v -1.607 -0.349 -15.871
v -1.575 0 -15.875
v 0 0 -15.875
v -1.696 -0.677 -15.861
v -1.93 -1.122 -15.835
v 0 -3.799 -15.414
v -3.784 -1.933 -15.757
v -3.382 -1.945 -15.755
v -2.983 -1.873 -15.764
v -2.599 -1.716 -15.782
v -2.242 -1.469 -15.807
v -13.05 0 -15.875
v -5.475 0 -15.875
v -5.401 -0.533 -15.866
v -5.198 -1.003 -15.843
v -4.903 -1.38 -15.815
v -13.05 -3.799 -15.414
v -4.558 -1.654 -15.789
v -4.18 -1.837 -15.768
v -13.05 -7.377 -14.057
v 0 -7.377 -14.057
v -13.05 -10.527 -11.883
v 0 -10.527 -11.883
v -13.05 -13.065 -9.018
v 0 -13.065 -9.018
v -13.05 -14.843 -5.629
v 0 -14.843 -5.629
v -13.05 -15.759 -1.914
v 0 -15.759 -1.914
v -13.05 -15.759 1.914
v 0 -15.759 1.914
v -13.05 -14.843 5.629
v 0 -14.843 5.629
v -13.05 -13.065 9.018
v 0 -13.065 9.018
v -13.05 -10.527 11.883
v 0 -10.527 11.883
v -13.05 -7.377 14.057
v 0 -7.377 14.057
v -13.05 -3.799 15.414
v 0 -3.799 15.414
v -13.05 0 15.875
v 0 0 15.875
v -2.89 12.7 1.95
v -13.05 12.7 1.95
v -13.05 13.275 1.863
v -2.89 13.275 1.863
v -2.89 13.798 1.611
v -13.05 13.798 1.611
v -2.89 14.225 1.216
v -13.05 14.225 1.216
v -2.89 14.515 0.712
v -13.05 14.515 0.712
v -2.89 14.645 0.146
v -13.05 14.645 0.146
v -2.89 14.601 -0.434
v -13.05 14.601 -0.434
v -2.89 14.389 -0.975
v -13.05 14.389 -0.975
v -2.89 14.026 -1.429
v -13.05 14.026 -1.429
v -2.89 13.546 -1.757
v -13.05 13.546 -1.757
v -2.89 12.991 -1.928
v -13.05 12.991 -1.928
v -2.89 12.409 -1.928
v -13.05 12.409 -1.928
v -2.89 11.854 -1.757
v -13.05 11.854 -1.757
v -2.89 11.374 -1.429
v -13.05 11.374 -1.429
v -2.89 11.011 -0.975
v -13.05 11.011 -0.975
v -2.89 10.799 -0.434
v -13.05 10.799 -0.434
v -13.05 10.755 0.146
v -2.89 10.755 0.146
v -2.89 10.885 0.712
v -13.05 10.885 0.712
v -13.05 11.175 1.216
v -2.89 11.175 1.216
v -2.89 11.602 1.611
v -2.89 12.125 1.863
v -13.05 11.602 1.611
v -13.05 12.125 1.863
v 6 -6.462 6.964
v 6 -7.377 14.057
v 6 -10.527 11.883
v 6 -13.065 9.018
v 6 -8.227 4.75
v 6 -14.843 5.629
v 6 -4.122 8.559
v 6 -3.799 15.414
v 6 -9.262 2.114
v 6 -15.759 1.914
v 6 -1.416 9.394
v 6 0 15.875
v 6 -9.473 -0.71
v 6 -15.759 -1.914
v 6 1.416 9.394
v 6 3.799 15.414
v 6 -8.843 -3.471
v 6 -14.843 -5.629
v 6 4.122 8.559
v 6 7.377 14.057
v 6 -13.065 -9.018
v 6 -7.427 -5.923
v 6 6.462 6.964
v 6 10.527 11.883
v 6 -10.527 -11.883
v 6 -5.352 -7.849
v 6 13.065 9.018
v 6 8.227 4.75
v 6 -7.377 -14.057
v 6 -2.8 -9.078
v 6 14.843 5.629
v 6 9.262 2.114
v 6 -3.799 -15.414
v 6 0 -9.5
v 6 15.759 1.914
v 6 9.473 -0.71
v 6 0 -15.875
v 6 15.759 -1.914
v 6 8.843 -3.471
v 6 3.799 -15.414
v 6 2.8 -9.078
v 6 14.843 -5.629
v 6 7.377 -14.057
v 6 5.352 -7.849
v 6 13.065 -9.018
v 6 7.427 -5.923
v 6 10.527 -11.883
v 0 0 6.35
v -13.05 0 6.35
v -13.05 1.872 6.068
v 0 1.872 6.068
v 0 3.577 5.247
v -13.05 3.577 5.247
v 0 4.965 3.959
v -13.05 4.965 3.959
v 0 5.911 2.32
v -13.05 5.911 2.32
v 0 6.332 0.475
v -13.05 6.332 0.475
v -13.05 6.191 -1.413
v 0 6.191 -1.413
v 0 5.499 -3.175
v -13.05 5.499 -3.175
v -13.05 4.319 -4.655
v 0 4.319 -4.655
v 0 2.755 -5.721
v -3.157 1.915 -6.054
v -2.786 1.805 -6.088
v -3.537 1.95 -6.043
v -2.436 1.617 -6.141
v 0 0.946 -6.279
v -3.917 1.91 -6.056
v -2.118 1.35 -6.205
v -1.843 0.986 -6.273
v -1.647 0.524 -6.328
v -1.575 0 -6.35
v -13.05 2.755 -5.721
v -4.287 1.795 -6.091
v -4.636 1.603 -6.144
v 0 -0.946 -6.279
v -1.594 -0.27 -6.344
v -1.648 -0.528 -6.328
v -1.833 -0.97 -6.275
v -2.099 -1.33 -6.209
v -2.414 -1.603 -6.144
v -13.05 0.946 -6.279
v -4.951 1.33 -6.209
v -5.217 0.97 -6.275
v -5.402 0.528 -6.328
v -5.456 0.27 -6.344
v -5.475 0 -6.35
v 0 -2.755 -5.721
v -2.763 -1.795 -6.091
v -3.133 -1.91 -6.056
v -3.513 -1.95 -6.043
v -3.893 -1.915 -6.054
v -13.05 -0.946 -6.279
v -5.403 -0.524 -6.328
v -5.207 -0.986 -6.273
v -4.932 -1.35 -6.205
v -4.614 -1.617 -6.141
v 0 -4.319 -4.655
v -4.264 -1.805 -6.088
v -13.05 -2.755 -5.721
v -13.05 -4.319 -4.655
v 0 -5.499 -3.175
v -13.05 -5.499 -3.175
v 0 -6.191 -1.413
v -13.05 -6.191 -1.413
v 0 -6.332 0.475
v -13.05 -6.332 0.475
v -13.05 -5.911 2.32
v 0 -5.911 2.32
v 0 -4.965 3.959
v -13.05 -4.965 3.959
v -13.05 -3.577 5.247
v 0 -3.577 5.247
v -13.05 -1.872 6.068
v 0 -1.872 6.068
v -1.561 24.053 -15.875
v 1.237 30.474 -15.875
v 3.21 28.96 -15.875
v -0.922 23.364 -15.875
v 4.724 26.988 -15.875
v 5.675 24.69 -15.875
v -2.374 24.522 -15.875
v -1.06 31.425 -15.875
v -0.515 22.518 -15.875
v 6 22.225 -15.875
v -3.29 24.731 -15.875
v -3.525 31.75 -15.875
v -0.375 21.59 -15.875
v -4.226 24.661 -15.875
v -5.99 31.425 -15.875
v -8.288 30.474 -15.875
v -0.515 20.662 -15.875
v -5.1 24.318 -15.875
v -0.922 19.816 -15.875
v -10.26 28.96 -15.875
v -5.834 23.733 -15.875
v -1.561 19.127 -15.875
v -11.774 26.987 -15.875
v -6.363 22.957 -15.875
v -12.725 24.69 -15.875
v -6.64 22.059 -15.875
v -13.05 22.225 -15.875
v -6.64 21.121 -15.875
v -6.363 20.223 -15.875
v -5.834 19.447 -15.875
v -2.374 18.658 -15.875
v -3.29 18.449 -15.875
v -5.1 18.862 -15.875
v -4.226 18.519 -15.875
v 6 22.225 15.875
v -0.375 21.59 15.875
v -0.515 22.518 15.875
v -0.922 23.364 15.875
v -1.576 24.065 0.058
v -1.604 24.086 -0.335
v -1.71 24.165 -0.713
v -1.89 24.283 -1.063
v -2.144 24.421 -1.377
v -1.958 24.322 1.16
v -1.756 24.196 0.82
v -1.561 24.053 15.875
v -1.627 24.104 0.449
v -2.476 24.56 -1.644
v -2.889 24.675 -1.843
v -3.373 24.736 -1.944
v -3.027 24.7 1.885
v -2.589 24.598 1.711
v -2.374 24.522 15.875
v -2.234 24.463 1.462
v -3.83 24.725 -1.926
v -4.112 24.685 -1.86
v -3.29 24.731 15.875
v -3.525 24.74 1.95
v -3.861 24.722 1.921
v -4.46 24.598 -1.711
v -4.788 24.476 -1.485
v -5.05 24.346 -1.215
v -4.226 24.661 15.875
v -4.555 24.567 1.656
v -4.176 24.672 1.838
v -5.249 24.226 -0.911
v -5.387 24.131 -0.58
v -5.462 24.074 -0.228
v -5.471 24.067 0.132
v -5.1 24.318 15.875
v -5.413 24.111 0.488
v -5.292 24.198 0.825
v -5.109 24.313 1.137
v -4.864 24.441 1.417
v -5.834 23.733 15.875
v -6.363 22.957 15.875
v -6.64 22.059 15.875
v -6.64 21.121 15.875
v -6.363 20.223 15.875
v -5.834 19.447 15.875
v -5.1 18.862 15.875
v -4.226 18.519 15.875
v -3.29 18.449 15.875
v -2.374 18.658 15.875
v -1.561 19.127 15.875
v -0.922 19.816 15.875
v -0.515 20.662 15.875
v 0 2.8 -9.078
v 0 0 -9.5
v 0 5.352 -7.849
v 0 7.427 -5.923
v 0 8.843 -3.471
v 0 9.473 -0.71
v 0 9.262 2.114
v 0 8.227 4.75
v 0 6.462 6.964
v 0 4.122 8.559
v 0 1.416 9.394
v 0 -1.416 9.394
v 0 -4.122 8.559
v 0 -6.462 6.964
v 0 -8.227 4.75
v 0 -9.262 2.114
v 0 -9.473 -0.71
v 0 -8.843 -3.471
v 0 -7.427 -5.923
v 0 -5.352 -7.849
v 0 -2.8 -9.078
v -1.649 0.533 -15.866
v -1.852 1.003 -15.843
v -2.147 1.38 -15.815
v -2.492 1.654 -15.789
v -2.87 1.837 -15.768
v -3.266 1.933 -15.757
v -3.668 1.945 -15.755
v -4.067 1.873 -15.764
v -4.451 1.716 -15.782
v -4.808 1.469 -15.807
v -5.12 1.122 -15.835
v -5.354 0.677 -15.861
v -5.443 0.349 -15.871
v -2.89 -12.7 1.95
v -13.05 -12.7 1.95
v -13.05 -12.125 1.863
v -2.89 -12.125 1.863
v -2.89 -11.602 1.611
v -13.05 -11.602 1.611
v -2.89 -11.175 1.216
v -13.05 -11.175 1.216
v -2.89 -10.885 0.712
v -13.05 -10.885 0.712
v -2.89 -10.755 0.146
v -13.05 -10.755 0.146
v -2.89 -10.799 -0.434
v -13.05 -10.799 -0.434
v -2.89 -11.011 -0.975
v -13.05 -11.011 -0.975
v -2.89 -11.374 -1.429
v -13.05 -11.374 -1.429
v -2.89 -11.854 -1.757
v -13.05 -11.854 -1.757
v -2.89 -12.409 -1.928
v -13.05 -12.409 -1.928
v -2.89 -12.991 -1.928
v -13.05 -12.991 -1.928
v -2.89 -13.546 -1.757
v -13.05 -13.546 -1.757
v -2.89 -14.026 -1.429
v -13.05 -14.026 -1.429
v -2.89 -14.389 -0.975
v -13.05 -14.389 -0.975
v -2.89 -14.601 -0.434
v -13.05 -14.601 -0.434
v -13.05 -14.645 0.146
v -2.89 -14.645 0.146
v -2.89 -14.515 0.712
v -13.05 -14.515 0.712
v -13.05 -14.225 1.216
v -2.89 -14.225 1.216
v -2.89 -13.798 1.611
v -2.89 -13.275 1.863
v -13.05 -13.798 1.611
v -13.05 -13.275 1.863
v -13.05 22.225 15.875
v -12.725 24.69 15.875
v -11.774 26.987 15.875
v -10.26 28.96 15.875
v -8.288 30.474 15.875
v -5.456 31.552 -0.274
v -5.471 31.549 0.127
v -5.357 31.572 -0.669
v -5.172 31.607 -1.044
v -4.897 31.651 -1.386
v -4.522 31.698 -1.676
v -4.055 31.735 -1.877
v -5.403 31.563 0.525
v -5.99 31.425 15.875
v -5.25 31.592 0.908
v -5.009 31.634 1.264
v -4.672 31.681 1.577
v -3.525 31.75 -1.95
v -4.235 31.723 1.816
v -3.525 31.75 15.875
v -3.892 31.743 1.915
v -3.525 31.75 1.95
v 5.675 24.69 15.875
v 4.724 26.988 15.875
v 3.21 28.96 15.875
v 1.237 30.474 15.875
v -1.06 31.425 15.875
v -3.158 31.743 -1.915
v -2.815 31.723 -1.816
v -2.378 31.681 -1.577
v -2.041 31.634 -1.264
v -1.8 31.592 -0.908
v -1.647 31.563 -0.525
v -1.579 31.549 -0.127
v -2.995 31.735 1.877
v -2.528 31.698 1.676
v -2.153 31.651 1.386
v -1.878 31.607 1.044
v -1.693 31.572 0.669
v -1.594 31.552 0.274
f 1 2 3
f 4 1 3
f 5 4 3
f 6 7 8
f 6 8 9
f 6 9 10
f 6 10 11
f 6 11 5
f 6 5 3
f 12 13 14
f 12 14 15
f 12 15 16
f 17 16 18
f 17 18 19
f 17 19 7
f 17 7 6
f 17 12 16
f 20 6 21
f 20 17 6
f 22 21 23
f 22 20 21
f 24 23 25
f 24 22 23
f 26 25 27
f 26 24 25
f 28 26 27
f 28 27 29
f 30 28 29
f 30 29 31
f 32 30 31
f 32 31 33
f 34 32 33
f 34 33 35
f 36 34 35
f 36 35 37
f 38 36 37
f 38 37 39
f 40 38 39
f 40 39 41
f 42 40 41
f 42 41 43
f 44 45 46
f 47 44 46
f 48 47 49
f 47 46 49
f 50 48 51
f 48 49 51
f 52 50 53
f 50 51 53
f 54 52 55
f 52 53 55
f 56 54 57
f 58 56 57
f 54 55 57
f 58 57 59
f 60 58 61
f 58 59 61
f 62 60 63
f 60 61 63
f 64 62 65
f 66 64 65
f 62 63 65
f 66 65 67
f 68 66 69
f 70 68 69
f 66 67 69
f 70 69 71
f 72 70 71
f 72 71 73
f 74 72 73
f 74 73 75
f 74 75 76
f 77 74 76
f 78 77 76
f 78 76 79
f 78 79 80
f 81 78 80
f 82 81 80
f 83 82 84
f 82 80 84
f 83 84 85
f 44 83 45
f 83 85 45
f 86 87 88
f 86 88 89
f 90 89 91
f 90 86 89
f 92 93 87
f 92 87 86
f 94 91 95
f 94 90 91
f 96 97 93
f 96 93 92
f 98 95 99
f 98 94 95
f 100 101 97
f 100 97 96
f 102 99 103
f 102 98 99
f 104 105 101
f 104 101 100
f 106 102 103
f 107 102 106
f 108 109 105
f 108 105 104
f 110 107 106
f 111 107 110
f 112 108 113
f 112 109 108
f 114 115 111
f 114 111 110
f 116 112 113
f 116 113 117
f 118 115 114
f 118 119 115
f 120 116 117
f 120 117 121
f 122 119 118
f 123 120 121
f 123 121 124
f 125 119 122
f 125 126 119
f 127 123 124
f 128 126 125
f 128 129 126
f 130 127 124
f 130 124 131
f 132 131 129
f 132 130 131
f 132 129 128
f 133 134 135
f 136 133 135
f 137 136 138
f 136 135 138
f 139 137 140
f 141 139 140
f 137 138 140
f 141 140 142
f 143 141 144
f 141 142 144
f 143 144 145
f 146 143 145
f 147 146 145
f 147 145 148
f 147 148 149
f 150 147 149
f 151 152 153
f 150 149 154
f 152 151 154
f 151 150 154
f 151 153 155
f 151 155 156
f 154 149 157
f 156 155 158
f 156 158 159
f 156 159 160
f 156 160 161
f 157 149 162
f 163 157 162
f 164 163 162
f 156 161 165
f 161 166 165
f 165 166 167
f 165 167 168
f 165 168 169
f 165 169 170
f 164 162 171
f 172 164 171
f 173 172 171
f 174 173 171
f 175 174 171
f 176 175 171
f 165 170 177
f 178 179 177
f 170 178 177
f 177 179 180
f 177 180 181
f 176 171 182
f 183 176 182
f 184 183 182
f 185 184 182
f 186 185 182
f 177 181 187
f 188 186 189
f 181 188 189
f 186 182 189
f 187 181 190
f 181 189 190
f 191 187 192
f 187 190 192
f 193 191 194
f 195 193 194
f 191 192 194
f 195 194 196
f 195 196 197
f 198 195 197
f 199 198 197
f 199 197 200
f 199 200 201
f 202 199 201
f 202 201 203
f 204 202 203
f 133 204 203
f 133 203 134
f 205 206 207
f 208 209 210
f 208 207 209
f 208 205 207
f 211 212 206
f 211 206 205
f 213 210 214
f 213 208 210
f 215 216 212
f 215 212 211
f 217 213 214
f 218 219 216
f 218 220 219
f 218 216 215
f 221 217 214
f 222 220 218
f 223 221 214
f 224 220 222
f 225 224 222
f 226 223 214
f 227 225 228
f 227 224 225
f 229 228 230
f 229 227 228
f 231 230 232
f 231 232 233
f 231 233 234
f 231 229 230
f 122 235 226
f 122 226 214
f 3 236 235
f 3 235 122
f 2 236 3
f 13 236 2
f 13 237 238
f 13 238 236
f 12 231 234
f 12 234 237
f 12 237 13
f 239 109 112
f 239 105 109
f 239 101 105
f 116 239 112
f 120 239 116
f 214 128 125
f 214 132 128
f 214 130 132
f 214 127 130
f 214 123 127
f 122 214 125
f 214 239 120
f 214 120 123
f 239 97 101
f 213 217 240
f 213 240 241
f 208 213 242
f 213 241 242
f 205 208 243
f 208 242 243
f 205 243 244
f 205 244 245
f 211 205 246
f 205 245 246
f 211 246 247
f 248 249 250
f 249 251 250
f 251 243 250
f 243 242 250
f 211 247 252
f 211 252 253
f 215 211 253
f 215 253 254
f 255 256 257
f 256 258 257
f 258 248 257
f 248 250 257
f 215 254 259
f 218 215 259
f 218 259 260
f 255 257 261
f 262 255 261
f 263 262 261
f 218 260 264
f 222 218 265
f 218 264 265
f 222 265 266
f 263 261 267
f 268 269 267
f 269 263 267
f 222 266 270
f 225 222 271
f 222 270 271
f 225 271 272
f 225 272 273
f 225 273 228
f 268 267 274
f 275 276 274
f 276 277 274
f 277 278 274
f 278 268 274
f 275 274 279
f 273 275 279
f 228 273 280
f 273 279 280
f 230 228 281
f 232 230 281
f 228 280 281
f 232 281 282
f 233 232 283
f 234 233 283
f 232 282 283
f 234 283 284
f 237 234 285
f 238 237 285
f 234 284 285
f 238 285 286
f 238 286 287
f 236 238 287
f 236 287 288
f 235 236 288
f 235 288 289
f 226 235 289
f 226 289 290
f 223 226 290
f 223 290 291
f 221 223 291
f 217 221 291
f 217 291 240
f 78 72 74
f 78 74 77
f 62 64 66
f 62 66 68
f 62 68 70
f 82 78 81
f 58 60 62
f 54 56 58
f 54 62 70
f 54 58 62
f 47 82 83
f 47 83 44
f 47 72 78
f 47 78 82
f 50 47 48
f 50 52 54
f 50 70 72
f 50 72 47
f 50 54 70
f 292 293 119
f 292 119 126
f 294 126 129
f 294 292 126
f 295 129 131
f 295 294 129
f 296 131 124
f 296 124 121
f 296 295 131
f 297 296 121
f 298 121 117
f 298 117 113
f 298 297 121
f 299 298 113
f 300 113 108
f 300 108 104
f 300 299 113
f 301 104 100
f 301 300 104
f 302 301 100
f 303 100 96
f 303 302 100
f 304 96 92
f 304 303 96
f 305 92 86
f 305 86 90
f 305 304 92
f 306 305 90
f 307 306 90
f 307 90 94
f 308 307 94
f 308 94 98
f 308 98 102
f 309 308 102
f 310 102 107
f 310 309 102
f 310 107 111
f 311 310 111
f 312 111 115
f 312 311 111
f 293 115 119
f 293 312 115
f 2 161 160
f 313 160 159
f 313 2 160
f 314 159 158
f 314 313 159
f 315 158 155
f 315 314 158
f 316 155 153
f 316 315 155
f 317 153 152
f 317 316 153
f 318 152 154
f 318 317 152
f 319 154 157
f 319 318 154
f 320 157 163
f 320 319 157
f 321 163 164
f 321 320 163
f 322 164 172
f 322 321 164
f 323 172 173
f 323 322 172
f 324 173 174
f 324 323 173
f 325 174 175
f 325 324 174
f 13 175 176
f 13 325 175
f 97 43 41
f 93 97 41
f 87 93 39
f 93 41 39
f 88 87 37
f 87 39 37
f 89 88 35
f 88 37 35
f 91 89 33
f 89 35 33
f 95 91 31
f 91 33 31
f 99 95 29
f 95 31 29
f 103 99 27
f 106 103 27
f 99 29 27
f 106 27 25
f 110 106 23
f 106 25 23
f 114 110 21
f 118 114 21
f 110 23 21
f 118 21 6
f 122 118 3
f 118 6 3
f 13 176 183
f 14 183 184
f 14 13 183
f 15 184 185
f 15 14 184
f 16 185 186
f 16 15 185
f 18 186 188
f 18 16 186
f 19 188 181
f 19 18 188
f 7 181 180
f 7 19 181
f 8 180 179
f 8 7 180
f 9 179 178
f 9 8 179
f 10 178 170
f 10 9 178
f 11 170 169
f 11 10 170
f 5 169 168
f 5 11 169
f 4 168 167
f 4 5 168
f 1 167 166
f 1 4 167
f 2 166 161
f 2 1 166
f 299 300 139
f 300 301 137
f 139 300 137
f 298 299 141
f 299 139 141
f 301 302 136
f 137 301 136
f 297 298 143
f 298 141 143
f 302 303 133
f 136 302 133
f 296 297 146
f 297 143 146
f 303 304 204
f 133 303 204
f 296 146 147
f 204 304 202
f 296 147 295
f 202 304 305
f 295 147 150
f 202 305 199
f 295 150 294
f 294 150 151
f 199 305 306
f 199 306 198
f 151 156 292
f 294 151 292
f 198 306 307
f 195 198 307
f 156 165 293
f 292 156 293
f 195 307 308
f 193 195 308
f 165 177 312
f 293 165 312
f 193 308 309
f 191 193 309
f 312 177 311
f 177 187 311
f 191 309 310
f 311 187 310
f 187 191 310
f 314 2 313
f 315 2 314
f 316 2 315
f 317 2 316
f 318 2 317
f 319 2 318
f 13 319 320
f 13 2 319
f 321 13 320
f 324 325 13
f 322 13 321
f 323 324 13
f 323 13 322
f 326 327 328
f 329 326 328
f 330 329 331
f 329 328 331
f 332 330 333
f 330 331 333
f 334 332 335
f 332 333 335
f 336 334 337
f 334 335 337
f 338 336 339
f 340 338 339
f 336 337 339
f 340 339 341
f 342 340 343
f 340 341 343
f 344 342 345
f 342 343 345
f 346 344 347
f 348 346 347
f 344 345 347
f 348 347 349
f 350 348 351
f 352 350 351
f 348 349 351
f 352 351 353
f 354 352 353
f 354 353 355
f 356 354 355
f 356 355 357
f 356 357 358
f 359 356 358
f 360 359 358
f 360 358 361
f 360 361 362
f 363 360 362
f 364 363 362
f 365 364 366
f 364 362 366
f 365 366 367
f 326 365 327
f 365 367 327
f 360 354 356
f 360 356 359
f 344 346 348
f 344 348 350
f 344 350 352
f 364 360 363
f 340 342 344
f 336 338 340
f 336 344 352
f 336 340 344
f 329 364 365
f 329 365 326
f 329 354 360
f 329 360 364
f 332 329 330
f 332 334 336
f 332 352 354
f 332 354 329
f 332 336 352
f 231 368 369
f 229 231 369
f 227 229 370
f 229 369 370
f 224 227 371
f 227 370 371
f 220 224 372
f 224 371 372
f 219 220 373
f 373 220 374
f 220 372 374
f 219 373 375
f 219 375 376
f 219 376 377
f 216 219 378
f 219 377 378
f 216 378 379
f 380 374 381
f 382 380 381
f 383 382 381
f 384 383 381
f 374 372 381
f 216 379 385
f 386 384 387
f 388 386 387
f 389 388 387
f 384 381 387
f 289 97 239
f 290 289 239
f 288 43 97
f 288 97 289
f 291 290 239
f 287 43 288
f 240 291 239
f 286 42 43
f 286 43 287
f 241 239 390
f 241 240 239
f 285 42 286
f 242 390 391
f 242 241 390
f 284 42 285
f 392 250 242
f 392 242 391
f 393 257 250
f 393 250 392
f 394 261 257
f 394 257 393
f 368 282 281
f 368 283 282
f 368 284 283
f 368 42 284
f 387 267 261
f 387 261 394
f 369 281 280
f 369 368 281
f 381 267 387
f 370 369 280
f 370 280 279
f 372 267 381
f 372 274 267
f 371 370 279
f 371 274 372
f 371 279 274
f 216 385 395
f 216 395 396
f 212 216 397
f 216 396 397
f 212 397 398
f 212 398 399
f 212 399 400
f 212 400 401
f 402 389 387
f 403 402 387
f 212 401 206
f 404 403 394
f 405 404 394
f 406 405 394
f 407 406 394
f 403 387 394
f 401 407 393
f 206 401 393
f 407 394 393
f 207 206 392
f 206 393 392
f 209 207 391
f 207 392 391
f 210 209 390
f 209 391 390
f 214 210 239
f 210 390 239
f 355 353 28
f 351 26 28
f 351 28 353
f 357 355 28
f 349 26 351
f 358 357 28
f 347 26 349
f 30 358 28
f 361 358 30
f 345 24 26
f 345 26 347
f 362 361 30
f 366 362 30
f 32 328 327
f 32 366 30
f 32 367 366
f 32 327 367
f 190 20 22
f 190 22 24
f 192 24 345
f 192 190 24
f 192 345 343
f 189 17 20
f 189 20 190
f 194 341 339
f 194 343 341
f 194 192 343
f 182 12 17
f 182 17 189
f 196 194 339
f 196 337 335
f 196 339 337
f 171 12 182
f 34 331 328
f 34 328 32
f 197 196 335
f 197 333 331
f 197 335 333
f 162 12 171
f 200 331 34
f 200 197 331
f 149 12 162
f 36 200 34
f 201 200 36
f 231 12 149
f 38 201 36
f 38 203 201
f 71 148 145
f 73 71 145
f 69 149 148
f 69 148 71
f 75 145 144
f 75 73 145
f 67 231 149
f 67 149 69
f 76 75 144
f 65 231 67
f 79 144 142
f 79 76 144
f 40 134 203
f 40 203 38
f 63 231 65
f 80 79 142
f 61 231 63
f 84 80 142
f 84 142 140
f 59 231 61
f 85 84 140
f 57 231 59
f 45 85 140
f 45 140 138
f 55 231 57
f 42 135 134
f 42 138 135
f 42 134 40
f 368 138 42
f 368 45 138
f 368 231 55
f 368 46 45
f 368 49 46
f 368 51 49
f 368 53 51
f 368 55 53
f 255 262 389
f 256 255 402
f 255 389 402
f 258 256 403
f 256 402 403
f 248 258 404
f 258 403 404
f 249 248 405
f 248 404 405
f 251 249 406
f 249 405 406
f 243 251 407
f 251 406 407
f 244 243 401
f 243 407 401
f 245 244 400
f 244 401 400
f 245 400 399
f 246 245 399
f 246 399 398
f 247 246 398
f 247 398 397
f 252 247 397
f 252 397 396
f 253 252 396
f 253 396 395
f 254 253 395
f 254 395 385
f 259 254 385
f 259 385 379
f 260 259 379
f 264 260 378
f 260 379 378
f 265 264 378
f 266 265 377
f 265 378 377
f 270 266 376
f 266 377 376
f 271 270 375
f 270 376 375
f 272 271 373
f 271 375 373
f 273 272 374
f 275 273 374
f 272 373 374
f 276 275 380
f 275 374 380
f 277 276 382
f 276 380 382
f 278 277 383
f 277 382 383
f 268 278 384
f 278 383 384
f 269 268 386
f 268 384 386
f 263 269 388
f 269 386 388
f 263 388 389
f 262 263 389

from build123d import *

# Parameters (mm, degrees)
SKETCH1_R               = 15.875
SKETCH1_R_2             = 9.5
BOSS_EXTRUDE1_DEPTH     = 6
BOSS_EXTRUDE2_START     = 13.050000011
SKETCH2_R               = 15.875
SKETCH2_R_2             = 9.5
SKETCH2_R_3             = 6.35
BOSS_EXTRUDE2_DEPTH     = 13.050000011
SKETCH3_R               = 1.95
CUT_EXTRUDE1_DEPTH      = 10.16
CUT_EXTRUDE3_REACH      = 39.82
CUT_EXTRUDE3_END_RADIUS = 6.35
BOSS_EXTRUDE3_REACH     = 31.444
SKETCH7_R               = 3.15
CUT_EXTRUDE4_DEPTH      = 31.75
CUT_EXTRUDE5_REACH      = 53.87
CUT_EXTRUDE5_END_RADIUS = 3.15
SKETCH8_R               = 1.95
FILLET1_R               = 9.525


with BuildPart() as part:
    # Sketch1 → Boss-Extrude1 (new body)
    with BuildSketch(Plane(origin=(0, 0, 0), x_dir=(0, 0, -1), z_dir=(1, 0, 0))):
        Circle(SKETCH1_R)
        Circle(SKETCH1_R_2, mode=Mode.SUBTRACT)
    extrude(amount=BOSS_EXTRUDE1_DEPTH)

    # Sketch2 → Boss-Extrude2 (add)
    # profile 1 of 2: a face of its own
    with BuildSketch(Plane.ZY.offset(BOSS_EXTRUDE2_START)):
        Circle(SKETCH2_R)
        with Locations(Location((0, 0, 0), (0, 0, 180))):
            Circle(SKETCH2_R_2, mode=Mode.SUBTRACT)
    # profile 2 of 2: a face of its own
    with BuildSketch(Plane.ZY.offset(BOSS_EXTRUDE2_START)):
        with Locations(Location((0, 0, 0), (0, 0, 180))):
            Circle(SKETCH2_R_2)
        Circle(SKETCH2_R_3, mode=Mode.SUBTRACT)
    extrude(amount=-BOSS_EXTRUDE2_DEPTH)

    # Sketch3 → Cut-Extrude1 (cut)
    with BuildSketch(Plane.ZY.offset(13.050000011)):
        with Locations((0, -12.7)):
            Circle(SKETCH3_R)
        with Locations((0, 12.7)):
            Circle(SKETCH3_R)
    extrude(amount=-CUT_EXTRUDE1_DEPTH, mode=Mode.SUBTRACT)

    # Cut-Extrude3: up to this cylinder (the profile starts outside it)
    cut_extrude3_end = Plane(origin=(-3.525, 0, 0), z_dir=(1, 0, 0)) * Cylinder(CUT_EXTRUDE3_END_RADIUS, 93.34, mode=Mode.PRIVATE)
    # Sketch5 → Cut-Extrude3 (cut, up to the surface)
    with BuildSketch(Plane.XY.offset(-15.875), mode=Mode.PRIVATE) as cut_extrude3_sk1:
        with BuildLine():
            ThreePointArc((-1.575000006, 0), (-3.525000006, 1.95), (-5.475000006, 0))
            Line((-5.475000006, 0), (-1.575000006, 0))
        make_face()
    cut_extrude3_tool1 = extrude(cut_extrude3_sk1.sketch, amount=CUT_EXTRUDE3_REACH, mode=Mode.PRIVATE) - cut_extrude3_end
    add(cut_extrude3_tool1.solids().sort_by_distance((-3.525, 0.827606, -15.875))[0], mode=Mode.SUBTRACT)
    # Sketch5 → Cut-Extrude3 (cut, up to the surface)
    with BuildSketch(Plane.XY.offset(-15.875), mode=Mode.PRIVATE) as cut_extrude3_sk2:
        with BuildLine():
            Line((-1.575000006, 0), (-5.475000006, 0))
            ThreePointArc((-5.475000006, 0), (-3.525000006, -1.95), (-1.575000006, 0))
        make_face()
    cut_extrude3_tool2 = extrude(cut_extrude3_sk2.sketch, amount=CUT_EXTRUDE3_REACH, mode=Mode.PRIVATE) - cut_extrude3_end
    add(cut_extrude3_tool2.solids().sort_by_distance((-3.525, -0.827606, -15.875))[0], mode=Mode.SUBTRACT)
    # Sketch5 → Cut-Extrude3 (cut, up to the surface)
    with BuildSketch(Plane.XY.offset(-15.875), mode=Mode.PRIVATE) as cut_extrude3_sk3:
        with BuildLine():
            ThreePointArc((-1.575000006, 0), (-3.525000006, 1.95), (-5.475000006, 0))
            Line((-5.475000006, 0), (-1.575000006, 0))
        make_face()
    cut_extrude3_tool3 = extrude(cut_extrude3_sk3.sketch, amount=CUT_EXTRUDE3_REACH, mode=Mode.PRIVATE) - cut_extrude3_end
    add(cut_extrude3_tool3.solids().sort_by_distance((-3.525, 0.827606, -15.875))[0], mode=Mode.SUBTRACT)
    # Sketch5 → Cut-Extrude3 (cut, up to the surface)
    with BuildSketch(Plane.XY.offset(-15.875), mode=Mode.PRIVATE) as cut_extrude3_sk4:
        with BuildLine():
            Line((-1.575000006, 0), (-5.475000006, 0))
            ThreePointArc((-5.475000006, 0), (-3.525000006, -1.95), (-1.575000006, 0))
        make_face()
    cut_extrude3_tool4 = extrude(cut_extrude3_sk4.sketch, amount=CUT_EXTRUDE3_REACH, mode=Mode.PRIVATE) - cut_extrude3_end
    add(cut_extrude3_tool4.solids().sort_by_distance((-3.525, -0.827606, -15.875))[0], mode=Mode.SUBTRACT)

    # Boss-Extrude3: up to this face of the body (flat: up to its plane)
    boss_extrude3_end = Plane(part.part.faces().sort_by_distance((6, 0, 15.425987194))[0])
    # Sketch6 → Boss-Extrude3 (add, up to the picked face)
    with BuildSketch(Plane.ZY.offset(13.050000011), mode=Mode.PRIVATE) as boss_extrude3_sk1:
        with BuildLine():
            Line((-15.875, 31.75), (-15.875, 0))
            ThreePointArc((-15.875, 0), (0, 15.875), (15.875, 0))
            Line((15.875, 0), (15.875, 31.75))
            Line((15.875, 31.75), (-15.875, 31.75))
        make_face()
    boss_extrude3_tool1 = split(extrude(boss_extrude3_sk1.sketch, amount=-BOSS_EXTRUDE3_REACH, mode=Mode.PRIVATE), bisect_by=boss_extrude3_end, keep=Keep.BOTH, mode=Mode.PRIVATE)
    add(boss_extrude3_tool1.solids().sort_by(Axis((-13.05, 21.783545, 0), (1, 0, 0)))[0])

    # Sketch7 → Cut-Extrude4 (cut)
    with BuildSketch(Plane.XY.offset(15.875)):
        with Locations((-3.525000006, 21.59)):
            Circle(SKETCH7_R)
    extrude(amount=-CUT_EXTRUDE4_DEPTH, mode=Mode.SUBTRACT)

    # Cut-Extrude5: up to this cylinder (the profile starts outside it)
    cut_extrude5_end = Plane(origin=(-3.525000006, 21.59, 0), z_dir=(0, 0, 1)) * Cylinder(CUT_EXTRUDE5_END_RADIUS, 115.04, mode=Mode.PRIVATE)
    # Sketch8 → Cut-Extrude5 (cut, up to the surface)
    with BuildSketch(Plane(origin=(0, 31.75, 0), x_dir=(1, 0, 0), z_dir=(0, 1, 0)), mode=Mode.PRIVATE) as cut_extrude5_sk1:
        with Locations(Location((-3.525000006, 0, 0), (0, 0, 270))):
            Circle(SKETCH8_R)
    cut_extrude5_tool1 = extrude(cut_extrude5_sk1.sketch, amount=-CUT_EXTRUDE5_REACH, mode=Mode.PRIVATE) - cut_extrude5_end
    add(cut_extrude5_tool1.solids().sort_by_distance((-3.525, 31.75, 0))[0], mode=Mode.SUBTRACT)

    # Fillet1
    # the kernel refuses this fillet: 9.525 mm, written as the material it takes off along each edge
    with BuildSketch(Plane(origin=(6, 31.75, 39.6875), x_dir=(0, -1, 0), z_dir=(0, 0, -1))) as fillet1_piece_1:
        with BuildLine():
            CenterArc((FILLET1_R, FILLET1_R), FILLET1_R, 180, 90)
            Line((0, FILLET1_R), (0, 0))
            Line((0, 0), (FILLET1_R, 0))
        make_face()
    extrude(amount=79.375, mode=Mode.SUBTRACT)
    with BuildSketch(Plane(origin=(-13.050000011, 31.75, 39.6875), x_dir=(0, -1, 0), z_dir=(0, 0, -1))) as fillet1_piece_2:
        with BuildLine():
            CenterArc((FILLET1_R, -FILLET1_R), FILLET1_R, 90, 90)
            Line((0, -FILLET1_R), (0, 0))
            Line((0, 0), (FILLET1_R, 0))
        make_face()
    extrude(amount=79.375, mode=Mode.SUBTRACT)


solid = part.part
